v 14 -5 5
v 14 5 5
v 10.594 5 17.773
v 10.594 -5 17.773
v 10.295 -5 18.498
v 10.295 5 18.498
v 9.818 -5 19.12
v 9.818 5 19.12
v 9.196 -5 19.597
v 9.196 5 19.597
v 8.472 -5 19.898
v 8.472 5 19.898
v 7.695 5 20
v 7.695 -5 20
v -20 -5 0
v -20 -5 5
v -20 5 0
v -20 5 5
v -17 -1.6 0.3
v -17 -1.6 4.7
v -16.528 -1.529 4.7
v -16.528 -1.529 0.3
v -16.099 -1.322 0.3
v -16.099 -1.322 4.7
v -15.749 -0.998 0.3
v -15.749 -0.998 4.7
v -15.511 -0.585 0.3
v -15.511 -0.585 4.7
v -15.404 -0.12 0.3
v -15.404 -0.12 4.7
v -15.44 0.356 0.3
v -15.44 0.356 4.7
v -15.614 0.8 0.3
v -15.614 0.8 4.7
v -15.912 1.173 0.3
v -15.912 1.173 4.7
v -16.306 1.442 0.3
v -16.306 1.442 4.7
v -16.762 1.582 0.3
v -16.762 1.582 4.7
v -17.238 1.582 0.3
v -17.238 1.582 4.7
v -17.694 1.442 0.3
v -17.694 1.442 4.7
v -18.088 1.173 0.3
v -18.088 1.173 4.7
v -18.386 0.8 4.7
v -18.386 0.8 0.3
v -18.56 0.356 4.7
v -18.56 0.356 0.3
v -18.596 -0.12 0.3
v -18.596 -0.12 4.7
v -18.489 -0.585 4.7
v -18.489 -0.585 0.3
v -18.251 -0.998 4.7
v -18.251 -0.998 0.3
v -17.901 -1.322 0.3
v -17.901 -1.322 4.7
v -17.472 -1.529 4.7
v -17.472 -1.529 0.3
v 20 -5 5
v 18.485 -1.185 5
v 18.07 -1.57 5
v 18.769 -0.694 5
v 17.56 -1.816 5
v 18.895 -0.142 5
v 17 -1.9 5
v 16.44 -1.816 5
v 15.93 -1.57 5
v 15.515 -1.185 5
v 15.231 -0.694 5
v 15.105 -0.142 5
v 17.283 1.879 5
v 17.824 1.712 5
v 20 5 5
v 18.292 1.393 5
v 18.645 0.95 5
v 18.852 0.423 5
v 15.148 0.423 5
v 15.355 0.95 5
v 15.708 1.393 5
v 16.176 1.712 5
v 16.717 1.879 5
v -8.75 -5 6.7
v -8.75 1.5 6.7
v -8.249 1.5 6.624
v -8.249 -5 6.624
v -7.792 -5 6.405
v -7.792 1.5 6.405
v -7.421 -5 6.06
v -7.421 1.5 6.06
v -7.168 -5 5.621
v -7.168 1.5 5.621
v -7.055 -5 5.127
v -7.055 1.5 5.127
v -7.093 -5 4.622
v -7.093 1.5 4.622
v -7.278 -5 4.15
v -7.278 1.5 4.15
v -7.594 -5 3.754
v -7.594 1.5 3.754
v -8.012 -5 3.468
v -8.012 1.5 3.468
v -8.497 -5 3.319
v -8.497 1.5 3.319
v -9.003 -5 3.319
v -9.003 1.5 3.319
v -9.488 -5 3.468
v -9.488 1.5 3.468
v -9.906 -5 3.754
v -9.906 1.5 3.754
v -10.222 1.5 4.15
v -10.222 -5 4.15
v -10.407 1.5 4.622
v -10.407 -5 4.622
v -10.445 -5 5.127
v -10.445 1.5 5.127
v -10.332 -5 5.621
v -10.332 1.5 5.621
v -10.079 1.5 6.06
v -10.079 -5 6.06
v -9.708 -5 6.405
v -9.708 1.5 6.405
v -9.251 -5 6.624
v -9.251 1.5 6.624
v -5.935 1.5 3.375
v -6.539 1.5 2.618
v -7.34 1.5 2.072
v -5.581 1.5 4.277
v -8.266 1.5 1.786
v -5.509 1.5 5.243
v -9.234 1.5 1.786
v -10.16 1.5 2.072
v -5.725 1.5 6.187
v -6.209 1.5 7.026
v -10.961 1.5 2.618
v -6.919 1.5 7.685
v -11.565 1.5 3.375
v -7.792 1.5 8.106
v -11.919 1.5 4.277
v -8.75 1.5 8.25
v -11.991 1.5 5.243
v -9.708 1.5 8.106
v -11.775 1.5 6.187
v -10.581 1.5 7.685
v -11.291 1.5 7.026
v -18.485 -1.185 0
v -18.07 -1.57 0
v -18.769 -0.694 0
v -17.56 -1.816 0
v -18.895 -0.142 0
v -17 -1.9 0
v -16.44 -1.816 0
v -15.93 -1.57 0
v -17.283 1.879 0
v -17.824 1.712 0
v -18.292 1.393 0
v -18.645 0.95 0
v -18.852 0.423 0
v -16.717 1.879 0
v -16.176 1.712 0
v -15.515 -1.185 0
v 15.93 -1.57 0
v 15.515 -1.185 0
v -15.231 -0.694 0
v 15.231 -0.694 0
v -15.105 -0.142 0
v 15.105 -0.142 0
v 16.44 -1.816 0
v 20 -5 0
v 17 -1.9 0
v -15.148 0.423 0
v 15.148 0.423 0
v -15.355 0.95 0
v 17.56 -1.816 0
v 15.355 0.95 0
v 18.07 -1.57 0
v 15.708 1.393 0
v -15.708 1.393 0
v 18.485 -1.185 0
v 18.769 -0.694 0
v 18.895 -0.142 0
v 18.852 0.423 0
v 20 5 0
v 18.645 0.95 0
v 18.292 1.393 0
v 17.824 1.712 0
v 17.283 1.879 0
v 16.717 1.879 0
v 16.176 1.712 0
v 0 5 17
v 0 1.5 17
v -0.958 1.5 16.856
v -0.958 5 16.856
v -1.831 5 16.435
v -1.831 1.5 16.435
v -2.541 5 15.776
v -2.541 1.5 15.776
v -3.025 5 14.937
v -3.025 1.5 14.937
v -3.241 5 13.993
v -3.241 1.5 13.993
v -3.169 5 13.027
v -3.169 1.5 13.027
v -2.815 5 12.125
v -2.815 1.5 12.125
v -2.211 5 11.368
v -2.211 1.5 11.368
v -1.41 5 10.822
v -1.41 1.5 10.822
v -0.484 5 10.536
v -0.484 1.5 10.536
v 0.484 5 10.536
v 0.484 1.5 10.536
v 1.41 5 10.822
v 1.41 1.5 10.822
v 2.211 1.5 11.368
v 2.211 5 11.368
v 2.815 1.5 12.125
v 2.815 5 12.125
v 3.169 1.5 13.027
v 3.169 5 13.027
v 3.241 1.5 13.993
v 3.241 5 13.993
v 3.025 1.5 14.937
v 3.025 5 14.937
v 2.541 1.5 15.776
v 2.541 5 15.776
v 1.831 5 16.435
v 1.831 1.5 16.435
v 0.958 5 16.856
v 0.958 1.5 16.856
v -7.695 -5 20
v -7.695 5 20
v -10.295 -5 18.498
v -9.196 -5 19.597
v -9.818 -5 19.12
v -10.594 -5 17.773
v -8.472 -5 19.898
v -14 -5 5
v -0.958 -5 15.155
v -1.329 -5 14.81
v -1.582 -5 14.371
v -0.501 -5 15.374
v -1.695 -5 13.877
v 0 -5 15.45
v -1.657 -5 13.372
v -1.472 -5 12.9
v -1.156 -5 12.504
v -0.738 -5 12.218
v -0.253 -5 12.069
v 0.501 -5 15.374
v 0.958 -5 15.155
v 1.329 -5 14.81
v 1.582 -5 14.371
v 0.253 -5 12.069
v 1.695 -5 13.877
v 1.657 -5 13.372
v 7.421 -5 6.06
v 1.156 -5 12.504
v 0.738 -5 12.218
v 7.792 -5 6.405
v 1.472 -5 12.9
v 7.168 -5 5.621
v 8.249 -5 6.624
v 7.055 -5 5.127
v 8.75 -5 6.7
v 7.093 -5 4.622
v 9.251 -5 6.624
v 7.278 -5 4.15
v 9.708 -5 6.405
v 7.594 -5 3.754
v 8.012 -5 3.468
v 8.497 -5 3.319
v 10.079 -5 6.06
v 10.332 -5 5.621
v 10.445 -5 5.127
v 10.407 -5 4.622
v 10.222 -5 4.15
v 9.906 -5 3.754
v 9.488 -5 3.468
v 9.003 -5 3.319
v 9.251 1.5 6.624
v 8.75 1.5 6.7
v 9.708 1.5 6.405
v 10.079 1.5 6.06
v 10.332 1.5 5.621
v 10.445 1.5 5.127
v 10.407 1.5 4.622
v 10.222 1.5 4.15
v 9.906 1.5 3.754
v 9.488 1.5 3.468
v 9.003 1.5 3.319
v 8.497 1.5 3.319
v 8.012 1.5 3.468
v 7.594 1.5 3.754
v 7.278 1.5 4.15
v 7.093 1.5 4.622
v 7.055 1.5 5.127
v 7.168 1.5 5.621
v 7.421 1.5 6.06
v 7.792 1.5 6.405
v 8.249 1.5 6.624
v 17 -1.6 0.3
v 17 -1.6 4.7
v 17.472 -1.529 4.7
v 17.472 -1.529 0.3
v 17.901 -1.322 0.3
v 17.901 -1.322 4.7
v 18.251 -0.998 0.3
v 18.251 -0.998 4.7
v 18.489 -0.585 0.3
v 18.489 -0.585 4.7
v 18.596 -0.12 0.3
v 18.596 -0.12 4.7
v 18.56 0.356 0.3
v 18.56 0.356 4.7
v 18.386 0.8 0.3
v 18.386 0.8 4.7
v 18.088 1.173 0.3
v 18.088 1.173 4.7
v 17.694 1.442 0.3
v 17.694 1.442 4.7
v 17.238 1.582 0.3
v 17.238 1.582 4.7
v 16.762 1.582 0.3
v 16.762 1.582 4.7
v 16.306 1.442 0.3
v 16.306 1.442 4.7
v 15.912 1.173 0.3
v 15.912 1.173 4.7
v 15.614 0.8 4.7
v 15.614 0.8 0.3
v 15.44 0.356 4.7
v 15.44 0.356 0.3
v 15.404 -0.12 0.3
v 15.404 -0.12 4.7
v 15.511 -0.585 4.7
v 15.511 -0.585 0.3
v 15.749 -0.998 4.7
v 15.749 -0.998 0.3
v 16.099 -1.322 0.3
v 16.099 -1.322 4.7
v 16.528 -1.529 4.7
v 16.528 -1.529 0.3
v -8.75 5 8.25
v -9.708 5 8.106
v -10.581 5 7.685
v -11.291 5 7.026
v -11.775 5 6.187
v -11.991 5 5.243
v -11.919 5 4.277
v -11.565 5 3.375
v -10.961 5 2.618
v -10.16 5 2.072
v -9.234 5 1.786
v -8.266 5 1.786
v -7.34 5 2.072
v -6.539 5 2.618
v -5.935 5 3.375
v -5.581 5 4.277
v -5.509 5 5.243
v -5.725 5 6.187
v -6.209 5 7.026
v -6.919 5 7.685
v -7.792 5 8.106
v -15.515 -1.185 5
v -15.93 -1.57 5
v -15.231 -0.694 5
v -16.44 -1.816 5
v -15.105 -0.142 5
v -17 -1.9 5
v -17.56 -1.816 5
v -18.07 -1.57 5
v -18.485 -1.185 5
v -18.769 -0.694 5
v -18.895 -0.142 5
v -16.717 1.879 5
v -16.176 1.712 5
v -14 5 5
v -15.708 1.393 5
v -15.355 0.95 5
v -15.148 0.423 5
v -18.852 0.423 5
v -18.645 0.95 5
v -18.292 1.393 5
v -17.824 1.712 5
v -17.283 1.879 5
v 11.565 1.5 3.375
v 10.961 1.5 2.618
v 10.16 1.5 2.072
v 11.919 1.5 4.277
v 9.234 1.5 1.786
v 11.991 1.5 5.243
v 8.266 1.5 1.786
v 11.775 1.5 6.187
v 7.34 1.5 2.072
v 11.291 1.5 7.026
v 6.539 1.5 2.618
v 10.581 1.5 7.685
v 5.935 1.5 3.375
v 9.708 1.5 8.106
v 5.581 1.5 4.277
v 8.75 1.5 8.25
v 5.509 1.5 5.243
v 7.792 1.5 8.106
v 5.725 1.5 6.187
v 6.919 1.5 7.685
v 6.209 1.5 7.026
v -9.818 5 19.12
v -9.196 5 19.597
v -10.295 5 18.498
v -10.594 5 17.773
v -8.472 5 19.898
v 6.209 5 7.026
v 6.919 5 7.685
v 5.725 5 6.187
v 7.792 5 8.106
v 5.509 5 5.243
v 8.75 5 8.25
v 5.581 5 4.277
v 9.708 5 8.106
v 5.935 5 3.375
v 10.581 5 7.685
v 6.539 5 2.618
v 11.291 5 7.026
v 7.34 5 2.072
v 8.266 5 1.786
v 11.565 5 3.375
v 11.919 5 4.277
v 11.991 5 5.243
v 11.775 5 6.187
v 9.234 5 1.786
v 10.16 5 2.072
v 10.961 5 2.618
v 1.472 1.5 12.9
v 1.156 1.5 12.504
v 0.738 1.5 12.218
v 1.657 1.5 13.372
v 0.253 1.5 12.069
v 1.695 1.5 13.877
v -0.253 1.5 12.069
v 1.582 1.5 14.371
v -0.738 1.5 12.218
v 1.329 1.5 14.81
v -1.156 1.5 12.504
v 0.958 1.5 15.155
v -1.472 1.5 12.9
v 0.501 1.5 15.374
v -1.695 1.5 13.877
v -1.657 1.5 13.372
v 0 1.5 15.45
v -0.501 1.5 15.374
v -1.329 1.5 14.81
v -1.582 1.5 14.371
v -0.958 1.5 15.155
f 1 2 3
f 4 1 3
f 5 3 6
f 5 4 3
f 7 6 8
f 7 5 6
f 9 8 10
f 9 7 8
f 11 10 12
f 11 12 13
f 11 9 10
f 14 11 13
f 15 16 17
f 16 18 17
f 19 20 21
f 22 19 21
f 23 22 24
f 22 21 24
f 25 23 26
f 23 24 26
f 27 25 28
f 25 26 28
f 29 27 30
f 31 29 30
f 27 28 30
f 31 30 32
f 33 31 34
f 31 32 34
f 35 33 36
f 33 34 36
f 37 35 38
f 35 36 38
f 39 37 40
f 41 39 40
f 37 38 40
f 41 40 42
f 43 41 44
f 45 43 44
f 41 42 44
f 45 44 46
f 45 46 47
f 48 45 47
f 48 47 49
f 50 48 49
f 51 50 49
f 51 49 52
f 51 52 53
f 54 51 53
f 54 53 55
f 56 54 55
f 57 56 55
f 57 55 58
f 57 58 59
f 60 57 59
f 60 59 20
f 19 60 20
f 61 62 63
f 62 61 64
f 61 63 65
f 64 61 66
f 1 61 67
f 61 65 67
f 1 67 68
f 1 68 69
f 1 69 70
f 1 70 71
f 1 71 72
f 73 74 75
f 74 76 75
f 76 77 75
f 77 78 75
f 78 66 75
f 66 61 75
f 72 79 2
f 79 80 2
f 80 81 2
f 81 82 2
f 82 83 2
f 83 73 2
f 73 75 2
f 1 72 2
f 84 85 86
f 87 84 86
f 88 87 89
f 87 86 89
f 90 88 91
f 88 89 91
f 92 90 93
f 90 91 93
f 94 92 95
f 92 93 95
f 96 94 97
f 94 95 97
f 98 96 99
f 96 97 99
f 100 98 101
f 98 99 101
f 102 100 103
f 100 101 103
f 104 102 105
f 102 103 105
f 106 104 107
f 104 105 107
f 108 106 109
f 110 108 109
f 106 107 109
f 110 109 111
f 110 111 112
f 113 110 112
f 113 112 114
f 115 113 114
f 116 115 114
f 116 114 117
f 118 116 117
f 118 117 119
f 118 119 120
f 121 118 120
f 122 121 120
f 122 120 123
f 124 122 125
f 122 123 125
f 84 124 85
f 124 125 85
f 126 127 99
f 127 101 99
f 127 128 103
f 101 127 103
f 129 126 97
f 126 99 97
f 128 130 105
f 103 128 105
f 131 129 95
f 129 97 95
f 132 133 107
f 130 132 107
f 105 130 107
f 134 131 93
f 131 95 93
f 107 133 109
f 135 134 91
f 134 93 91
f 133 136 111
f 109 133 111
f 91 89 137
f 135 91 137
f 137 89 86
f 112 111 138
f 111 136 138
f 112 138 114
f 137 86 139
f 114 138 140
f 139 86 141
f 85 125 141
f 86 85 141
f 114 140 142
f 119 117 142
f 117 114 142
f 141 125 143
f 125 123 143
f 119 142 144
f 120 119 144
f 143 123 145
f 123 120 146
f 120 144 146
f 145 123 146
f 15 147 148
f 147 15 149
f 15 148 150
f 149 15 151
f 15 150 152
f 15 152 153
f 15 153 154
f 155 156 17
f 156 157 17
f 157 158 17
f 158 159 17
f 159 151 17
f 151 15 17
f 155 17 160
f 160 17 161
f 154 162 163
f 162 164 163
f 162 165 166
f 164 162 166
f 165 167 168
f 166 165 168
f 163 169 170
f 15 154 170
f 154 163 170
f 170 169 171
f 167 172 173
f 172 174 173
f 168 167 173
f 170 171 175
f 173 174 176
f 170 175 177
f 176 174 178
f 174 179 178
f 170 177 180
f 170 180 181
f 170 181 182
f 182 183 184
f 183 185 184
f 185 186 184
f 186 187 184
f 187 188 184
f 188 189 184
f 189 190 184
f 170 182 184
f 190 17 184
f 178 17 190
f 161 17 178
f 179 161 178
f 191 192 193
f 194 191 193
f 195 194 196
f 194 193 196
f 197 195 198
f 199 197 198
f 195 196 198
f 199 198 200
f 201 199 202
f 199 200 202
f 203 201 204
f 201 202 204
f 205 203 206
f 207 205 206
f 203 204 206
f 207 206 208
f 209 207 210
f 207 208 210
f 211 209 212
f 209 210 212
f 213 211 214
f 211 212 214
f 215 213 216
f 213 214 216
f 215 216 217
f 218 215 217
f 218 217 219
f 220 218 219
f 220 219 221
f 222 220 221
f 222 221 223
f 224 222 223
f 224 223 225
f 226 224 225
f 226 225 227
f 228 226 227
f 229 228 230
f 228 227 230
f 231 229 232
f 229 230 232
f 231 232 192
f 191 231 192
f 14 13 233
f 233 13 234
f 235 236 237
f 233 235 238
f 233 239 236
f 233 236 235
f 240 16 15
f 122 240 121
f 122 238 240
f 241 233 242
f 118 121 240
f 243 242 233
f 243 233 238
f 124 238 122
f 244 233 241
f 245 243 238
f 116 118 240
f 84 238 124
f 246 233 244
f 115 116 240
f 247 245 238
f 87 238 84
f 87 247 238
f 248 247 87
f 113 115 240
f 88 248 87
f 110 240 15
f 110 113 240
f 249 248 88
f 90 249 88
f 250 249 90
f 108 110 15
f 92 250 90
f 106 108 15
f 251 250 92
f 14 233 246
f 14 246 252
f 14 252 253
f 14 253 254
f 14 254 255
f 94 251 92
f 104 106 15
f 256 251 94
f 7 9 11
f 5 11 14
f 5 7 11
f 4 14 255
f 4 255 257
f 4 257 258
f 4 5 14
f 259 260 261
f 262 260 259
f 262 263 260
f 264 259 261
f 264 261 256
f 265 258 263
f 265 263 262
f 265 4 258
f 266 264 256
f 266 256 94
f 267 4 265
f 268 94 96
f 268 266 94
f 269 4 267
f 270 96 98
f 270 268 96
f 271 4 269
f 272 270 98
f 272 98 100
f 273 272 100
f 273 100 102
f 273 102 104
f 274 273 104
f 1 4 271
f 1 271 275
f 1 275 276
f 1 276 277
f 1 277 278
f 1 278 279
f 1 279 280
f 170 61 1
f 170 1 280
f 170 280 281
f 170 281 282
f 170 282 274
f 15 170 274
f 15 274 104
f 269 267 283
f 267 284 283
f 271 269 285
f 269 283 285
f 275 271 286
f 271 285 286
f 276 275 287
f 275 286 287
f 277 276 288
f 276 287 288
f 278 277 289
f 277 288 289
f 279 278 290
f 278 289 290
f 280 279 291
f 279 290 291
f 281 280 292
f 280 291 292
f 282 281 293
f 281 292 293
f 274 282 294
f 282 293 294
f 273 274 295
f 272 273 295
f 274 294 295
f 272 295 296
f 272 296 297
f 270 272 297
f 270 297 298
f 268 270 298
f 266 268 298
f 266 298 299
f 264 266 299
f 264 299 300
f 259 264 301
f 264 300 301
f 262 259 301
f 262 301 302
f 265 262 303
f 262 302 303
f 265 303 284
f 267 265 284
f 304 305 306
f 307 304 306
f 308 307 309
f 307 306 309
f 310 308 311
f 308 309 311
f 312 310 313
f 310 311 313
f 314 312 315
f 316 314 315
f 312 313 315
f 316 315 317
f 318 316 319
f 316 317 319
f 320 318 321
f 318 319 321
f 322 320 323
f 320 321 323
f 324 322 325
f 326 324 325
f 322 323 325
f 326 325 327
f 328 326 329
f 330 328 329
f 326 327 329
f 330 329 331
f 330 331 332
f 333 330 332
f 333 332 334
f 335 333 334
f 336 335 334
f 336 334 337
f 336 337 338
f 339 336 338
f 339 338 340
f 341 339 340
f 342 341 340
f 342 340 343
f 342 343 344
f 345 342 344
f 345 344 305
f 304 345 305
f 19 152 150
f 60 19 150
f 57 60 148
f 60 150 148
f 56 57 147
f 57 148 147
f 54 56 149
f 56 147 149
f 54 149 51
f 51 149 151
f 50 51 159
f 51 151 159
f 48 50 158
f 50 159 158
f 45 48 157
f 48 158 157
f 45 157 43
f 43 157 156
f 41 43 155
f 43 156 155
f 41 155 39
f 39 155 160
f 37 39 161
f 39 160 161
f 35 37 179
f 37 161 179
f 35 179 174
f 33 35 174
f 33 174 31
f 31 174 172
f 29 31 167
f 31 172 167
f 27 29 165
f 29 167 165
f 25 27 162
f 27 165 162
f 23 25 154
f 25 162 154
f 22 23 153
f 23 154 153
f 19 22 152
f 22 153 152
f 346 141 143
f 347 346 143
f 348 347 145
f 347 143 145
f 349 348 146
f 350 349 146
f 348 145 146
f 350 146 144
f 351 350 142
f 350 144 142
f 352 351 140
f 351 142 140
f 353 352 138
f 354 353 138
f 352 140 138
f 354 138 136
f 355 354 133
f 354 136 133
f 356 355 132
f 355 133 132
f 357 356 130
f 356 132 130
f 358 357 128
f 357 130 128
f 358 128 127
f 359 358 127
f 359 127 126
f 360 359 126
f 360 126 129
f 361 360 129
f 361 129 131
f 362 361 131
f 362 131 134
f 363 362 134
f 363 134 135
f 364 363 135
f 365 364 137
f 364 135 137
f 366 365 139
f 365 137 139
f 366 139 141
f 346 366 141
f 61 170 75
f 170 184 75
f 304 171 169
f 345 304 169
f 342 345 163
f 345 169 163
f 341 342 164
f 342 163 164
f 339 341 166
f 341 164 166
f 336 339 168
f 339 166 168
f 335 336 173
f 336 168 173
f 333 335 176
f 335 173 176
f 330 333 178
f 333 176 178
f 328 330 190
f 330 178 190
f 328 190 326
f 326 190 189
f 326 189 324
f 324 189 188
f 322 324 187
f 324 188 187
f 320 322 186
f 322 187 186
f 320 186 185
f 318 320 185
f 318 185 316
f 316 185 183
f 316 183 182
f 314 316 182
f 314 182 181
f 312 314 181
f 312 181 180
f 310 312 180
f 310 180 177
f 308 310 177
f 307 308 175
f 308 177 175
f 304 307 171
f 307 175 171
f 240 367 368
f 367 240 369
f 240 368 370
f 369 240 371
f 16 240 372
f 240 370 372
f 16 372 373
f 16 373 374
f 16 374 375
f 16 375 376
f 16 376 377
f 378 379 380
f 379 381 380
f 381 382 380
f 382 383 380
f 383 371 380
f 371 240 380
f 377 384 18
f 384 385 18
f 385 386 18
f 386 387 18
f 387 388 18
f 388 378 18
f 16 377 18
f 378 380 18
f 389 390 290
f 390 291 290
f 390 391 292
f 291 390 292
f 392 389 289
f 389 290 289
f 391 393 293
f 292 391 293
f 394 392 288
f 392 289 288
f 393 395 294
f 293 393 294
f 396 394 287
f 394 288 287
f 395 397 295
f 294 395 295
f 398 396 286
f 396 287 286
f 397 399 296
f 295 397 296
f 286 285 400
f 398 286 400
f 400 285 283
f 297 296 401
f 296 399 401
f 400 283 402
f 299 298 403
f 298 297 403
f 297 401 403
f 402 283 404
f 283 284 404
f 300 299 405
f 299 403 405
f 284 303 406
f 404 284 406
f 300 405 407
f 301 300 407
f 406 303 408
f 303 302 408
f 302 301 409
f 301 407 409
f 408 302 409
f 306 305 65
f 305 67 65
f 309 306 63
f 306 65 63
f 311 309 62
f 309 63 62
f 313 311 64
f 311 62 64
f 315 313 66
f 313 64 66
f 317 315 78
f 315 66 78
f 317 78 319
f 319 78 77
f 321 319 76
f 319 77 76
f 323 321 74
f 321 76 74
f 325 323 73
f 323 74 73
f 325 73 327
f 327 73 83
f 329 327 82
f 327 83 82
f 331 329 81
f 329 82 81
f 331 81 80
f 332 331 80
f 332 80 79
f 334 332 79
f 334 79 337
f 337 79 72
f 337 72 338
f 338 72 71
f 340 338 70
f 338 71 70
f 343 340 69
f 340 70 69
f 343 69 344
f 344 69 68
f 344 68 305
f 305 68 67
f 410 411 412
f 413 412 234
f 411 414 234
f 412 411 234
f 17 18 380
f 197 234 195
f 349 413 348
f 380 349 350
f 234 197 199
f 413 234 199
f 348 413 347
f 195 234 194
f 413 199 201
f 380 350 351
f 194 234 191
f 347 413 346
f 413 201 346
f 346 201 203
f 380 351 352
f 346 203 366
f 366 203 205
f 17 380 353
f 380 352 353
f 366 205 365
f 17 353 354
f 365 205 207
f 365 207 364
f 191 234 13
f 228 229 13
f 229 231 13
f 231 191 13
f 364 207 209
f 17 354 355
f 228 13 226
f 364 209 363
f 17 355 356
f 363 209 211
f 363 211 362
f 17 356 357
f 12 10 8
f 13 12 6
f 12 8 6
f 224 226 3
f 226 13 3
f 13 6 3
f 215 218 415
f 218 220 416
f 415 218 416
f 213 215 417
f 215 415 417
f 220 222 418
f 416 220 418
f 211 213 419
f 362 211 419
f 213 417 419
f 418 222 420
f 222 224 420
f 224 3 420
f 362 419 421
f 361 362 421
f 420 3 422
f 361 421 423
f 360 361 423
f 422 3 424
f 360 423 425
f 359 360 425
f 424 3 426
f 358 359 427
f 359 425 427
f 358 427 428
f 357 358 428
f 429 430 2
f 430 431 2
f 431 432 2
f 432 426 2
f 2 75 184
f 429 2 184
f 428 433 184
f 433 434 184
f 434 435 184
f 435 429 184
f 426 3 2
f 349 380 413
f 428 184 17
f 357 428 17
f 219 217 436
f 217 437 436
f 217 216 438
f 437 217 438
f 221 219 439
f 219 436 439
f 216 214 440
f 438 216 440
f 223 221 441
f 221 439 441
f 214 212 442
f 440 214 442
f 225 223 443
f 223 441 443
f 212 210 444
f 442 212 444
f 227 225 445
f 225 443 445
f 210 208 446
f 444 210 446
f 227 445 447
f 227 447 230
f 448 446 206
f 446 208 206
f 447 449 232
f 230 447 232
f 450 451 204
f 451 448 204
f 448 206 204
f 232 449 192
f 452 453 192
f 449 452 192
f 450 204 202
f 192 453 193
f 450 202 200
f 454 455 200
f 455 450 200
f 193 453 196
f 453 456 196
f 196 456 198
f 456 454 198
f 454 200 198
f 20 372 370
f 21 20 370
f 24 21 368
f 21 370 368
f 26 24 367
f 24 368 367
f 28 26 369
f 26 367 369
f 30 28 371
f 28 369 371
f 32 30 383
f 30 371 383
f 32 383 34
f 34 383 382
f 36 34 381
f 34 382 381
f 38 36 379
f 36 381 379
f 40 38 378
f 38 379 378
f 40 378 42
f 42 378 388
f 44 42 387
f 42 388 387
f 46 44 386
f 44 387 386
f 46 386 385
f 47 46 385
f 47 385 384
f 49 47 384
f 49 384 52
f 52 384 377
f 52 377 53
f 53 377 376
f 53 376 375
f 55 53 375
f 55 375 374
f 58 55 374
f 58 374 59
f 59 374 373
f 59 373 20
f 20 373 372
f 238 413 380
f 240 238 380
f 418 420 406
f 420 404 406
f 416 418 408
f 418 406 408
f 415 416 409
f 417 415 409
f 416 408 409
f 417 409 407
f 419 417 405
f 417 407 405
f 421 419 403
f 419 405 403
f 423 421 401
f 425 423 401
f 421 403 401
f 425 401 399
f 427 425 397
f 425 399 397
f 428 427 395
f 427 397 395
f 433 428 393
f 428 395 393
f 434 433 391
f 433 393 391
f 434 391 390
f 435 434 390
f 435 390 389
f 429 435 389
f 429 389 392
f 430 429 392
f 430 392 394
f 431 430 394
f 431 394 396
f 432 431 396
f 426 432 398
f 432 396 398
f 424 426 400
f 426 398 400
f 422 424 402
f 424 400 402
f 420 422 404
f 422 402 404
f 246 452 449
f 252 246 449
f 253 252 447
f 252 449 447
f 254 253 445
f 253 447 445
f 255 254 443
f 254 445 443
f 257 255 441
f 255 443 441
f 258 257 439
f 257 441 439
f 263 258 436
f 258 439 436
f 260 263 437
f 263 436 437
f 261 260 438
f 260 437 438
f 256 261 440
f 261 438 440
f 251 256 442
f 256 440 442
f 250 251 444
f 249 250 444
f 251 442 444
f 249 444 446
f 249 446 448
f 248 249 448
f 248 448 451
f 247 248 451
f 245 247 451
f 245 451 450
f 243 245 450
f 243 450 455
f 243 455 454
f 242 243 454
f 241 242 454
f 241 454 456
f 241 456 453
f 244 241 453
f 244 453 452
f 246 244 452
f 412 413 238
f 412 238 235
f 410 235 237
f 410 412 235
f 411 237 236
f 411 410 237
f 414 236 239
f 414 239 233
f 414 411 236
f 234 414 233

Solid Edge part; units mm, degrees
sketch "Sketch1" plane through (0, 0, 0) normal (0, -1, 0) x (1, 0, 0)
  line L0 (-20, 5) -> (-20, 0)
  line L1 (-20, 0) -> (20, 0)
  line L2 (20, 0) -> (20, 5)
  line L3 (20, 5) -> (14, 5)
  line L4 (14, 5) -> (10, 20)
  line L5 (10, 20) -> (-10, 20)
  line L6 (-10, 20) -> (-14, 5)
  line L7 (-14, 5) -> (-20, 5)
  dimension "D1" = 20
  dimension "D2" = 40
  dimension "D3" = 28
  dimension "D4" = 5
  dimension "D5" = 15
extrude "Protrusion1" add sketch "Sketch1" along normal mid plane 10
fillet "rounds" radius 3 2 edges at (10, 0, 20) (-10, 0, 20)
hole "Hole1" at (0, 5, 13.75) direction (0, -1, 0) diameter 3.4 end up to next counterbore diameter 6.5 counterbore depth 3.5
hole "Hole2" at (8.75, 5, 5) direction (0, -1, 0) diameter 3.4 end up to next counterbore diameter 6.5 counterbore depth 3.5
hole "Hole3" at (-8.75, 5, 5) direction (0, -1, 0) diameter 3.4 end up to next counterbore diameter 6.5 counterbore depth 3.5
hole "Hole4" at (-17, 0, 5) direction (0, 0, -1) diameter 3.2 end up to next start chamfer 0.3 start chamfer angle 45 end chamfer 0.3 end chamfer angle 45
hole "Hole5" at (17, 0, 5) direction (0, 0, -1) diameter 3.2 end up to next start chamfer 0.3 start chamfer angle 45 end chamfer 0.3 end chamfer angle 45
properties material "Polyethylene, low density"
